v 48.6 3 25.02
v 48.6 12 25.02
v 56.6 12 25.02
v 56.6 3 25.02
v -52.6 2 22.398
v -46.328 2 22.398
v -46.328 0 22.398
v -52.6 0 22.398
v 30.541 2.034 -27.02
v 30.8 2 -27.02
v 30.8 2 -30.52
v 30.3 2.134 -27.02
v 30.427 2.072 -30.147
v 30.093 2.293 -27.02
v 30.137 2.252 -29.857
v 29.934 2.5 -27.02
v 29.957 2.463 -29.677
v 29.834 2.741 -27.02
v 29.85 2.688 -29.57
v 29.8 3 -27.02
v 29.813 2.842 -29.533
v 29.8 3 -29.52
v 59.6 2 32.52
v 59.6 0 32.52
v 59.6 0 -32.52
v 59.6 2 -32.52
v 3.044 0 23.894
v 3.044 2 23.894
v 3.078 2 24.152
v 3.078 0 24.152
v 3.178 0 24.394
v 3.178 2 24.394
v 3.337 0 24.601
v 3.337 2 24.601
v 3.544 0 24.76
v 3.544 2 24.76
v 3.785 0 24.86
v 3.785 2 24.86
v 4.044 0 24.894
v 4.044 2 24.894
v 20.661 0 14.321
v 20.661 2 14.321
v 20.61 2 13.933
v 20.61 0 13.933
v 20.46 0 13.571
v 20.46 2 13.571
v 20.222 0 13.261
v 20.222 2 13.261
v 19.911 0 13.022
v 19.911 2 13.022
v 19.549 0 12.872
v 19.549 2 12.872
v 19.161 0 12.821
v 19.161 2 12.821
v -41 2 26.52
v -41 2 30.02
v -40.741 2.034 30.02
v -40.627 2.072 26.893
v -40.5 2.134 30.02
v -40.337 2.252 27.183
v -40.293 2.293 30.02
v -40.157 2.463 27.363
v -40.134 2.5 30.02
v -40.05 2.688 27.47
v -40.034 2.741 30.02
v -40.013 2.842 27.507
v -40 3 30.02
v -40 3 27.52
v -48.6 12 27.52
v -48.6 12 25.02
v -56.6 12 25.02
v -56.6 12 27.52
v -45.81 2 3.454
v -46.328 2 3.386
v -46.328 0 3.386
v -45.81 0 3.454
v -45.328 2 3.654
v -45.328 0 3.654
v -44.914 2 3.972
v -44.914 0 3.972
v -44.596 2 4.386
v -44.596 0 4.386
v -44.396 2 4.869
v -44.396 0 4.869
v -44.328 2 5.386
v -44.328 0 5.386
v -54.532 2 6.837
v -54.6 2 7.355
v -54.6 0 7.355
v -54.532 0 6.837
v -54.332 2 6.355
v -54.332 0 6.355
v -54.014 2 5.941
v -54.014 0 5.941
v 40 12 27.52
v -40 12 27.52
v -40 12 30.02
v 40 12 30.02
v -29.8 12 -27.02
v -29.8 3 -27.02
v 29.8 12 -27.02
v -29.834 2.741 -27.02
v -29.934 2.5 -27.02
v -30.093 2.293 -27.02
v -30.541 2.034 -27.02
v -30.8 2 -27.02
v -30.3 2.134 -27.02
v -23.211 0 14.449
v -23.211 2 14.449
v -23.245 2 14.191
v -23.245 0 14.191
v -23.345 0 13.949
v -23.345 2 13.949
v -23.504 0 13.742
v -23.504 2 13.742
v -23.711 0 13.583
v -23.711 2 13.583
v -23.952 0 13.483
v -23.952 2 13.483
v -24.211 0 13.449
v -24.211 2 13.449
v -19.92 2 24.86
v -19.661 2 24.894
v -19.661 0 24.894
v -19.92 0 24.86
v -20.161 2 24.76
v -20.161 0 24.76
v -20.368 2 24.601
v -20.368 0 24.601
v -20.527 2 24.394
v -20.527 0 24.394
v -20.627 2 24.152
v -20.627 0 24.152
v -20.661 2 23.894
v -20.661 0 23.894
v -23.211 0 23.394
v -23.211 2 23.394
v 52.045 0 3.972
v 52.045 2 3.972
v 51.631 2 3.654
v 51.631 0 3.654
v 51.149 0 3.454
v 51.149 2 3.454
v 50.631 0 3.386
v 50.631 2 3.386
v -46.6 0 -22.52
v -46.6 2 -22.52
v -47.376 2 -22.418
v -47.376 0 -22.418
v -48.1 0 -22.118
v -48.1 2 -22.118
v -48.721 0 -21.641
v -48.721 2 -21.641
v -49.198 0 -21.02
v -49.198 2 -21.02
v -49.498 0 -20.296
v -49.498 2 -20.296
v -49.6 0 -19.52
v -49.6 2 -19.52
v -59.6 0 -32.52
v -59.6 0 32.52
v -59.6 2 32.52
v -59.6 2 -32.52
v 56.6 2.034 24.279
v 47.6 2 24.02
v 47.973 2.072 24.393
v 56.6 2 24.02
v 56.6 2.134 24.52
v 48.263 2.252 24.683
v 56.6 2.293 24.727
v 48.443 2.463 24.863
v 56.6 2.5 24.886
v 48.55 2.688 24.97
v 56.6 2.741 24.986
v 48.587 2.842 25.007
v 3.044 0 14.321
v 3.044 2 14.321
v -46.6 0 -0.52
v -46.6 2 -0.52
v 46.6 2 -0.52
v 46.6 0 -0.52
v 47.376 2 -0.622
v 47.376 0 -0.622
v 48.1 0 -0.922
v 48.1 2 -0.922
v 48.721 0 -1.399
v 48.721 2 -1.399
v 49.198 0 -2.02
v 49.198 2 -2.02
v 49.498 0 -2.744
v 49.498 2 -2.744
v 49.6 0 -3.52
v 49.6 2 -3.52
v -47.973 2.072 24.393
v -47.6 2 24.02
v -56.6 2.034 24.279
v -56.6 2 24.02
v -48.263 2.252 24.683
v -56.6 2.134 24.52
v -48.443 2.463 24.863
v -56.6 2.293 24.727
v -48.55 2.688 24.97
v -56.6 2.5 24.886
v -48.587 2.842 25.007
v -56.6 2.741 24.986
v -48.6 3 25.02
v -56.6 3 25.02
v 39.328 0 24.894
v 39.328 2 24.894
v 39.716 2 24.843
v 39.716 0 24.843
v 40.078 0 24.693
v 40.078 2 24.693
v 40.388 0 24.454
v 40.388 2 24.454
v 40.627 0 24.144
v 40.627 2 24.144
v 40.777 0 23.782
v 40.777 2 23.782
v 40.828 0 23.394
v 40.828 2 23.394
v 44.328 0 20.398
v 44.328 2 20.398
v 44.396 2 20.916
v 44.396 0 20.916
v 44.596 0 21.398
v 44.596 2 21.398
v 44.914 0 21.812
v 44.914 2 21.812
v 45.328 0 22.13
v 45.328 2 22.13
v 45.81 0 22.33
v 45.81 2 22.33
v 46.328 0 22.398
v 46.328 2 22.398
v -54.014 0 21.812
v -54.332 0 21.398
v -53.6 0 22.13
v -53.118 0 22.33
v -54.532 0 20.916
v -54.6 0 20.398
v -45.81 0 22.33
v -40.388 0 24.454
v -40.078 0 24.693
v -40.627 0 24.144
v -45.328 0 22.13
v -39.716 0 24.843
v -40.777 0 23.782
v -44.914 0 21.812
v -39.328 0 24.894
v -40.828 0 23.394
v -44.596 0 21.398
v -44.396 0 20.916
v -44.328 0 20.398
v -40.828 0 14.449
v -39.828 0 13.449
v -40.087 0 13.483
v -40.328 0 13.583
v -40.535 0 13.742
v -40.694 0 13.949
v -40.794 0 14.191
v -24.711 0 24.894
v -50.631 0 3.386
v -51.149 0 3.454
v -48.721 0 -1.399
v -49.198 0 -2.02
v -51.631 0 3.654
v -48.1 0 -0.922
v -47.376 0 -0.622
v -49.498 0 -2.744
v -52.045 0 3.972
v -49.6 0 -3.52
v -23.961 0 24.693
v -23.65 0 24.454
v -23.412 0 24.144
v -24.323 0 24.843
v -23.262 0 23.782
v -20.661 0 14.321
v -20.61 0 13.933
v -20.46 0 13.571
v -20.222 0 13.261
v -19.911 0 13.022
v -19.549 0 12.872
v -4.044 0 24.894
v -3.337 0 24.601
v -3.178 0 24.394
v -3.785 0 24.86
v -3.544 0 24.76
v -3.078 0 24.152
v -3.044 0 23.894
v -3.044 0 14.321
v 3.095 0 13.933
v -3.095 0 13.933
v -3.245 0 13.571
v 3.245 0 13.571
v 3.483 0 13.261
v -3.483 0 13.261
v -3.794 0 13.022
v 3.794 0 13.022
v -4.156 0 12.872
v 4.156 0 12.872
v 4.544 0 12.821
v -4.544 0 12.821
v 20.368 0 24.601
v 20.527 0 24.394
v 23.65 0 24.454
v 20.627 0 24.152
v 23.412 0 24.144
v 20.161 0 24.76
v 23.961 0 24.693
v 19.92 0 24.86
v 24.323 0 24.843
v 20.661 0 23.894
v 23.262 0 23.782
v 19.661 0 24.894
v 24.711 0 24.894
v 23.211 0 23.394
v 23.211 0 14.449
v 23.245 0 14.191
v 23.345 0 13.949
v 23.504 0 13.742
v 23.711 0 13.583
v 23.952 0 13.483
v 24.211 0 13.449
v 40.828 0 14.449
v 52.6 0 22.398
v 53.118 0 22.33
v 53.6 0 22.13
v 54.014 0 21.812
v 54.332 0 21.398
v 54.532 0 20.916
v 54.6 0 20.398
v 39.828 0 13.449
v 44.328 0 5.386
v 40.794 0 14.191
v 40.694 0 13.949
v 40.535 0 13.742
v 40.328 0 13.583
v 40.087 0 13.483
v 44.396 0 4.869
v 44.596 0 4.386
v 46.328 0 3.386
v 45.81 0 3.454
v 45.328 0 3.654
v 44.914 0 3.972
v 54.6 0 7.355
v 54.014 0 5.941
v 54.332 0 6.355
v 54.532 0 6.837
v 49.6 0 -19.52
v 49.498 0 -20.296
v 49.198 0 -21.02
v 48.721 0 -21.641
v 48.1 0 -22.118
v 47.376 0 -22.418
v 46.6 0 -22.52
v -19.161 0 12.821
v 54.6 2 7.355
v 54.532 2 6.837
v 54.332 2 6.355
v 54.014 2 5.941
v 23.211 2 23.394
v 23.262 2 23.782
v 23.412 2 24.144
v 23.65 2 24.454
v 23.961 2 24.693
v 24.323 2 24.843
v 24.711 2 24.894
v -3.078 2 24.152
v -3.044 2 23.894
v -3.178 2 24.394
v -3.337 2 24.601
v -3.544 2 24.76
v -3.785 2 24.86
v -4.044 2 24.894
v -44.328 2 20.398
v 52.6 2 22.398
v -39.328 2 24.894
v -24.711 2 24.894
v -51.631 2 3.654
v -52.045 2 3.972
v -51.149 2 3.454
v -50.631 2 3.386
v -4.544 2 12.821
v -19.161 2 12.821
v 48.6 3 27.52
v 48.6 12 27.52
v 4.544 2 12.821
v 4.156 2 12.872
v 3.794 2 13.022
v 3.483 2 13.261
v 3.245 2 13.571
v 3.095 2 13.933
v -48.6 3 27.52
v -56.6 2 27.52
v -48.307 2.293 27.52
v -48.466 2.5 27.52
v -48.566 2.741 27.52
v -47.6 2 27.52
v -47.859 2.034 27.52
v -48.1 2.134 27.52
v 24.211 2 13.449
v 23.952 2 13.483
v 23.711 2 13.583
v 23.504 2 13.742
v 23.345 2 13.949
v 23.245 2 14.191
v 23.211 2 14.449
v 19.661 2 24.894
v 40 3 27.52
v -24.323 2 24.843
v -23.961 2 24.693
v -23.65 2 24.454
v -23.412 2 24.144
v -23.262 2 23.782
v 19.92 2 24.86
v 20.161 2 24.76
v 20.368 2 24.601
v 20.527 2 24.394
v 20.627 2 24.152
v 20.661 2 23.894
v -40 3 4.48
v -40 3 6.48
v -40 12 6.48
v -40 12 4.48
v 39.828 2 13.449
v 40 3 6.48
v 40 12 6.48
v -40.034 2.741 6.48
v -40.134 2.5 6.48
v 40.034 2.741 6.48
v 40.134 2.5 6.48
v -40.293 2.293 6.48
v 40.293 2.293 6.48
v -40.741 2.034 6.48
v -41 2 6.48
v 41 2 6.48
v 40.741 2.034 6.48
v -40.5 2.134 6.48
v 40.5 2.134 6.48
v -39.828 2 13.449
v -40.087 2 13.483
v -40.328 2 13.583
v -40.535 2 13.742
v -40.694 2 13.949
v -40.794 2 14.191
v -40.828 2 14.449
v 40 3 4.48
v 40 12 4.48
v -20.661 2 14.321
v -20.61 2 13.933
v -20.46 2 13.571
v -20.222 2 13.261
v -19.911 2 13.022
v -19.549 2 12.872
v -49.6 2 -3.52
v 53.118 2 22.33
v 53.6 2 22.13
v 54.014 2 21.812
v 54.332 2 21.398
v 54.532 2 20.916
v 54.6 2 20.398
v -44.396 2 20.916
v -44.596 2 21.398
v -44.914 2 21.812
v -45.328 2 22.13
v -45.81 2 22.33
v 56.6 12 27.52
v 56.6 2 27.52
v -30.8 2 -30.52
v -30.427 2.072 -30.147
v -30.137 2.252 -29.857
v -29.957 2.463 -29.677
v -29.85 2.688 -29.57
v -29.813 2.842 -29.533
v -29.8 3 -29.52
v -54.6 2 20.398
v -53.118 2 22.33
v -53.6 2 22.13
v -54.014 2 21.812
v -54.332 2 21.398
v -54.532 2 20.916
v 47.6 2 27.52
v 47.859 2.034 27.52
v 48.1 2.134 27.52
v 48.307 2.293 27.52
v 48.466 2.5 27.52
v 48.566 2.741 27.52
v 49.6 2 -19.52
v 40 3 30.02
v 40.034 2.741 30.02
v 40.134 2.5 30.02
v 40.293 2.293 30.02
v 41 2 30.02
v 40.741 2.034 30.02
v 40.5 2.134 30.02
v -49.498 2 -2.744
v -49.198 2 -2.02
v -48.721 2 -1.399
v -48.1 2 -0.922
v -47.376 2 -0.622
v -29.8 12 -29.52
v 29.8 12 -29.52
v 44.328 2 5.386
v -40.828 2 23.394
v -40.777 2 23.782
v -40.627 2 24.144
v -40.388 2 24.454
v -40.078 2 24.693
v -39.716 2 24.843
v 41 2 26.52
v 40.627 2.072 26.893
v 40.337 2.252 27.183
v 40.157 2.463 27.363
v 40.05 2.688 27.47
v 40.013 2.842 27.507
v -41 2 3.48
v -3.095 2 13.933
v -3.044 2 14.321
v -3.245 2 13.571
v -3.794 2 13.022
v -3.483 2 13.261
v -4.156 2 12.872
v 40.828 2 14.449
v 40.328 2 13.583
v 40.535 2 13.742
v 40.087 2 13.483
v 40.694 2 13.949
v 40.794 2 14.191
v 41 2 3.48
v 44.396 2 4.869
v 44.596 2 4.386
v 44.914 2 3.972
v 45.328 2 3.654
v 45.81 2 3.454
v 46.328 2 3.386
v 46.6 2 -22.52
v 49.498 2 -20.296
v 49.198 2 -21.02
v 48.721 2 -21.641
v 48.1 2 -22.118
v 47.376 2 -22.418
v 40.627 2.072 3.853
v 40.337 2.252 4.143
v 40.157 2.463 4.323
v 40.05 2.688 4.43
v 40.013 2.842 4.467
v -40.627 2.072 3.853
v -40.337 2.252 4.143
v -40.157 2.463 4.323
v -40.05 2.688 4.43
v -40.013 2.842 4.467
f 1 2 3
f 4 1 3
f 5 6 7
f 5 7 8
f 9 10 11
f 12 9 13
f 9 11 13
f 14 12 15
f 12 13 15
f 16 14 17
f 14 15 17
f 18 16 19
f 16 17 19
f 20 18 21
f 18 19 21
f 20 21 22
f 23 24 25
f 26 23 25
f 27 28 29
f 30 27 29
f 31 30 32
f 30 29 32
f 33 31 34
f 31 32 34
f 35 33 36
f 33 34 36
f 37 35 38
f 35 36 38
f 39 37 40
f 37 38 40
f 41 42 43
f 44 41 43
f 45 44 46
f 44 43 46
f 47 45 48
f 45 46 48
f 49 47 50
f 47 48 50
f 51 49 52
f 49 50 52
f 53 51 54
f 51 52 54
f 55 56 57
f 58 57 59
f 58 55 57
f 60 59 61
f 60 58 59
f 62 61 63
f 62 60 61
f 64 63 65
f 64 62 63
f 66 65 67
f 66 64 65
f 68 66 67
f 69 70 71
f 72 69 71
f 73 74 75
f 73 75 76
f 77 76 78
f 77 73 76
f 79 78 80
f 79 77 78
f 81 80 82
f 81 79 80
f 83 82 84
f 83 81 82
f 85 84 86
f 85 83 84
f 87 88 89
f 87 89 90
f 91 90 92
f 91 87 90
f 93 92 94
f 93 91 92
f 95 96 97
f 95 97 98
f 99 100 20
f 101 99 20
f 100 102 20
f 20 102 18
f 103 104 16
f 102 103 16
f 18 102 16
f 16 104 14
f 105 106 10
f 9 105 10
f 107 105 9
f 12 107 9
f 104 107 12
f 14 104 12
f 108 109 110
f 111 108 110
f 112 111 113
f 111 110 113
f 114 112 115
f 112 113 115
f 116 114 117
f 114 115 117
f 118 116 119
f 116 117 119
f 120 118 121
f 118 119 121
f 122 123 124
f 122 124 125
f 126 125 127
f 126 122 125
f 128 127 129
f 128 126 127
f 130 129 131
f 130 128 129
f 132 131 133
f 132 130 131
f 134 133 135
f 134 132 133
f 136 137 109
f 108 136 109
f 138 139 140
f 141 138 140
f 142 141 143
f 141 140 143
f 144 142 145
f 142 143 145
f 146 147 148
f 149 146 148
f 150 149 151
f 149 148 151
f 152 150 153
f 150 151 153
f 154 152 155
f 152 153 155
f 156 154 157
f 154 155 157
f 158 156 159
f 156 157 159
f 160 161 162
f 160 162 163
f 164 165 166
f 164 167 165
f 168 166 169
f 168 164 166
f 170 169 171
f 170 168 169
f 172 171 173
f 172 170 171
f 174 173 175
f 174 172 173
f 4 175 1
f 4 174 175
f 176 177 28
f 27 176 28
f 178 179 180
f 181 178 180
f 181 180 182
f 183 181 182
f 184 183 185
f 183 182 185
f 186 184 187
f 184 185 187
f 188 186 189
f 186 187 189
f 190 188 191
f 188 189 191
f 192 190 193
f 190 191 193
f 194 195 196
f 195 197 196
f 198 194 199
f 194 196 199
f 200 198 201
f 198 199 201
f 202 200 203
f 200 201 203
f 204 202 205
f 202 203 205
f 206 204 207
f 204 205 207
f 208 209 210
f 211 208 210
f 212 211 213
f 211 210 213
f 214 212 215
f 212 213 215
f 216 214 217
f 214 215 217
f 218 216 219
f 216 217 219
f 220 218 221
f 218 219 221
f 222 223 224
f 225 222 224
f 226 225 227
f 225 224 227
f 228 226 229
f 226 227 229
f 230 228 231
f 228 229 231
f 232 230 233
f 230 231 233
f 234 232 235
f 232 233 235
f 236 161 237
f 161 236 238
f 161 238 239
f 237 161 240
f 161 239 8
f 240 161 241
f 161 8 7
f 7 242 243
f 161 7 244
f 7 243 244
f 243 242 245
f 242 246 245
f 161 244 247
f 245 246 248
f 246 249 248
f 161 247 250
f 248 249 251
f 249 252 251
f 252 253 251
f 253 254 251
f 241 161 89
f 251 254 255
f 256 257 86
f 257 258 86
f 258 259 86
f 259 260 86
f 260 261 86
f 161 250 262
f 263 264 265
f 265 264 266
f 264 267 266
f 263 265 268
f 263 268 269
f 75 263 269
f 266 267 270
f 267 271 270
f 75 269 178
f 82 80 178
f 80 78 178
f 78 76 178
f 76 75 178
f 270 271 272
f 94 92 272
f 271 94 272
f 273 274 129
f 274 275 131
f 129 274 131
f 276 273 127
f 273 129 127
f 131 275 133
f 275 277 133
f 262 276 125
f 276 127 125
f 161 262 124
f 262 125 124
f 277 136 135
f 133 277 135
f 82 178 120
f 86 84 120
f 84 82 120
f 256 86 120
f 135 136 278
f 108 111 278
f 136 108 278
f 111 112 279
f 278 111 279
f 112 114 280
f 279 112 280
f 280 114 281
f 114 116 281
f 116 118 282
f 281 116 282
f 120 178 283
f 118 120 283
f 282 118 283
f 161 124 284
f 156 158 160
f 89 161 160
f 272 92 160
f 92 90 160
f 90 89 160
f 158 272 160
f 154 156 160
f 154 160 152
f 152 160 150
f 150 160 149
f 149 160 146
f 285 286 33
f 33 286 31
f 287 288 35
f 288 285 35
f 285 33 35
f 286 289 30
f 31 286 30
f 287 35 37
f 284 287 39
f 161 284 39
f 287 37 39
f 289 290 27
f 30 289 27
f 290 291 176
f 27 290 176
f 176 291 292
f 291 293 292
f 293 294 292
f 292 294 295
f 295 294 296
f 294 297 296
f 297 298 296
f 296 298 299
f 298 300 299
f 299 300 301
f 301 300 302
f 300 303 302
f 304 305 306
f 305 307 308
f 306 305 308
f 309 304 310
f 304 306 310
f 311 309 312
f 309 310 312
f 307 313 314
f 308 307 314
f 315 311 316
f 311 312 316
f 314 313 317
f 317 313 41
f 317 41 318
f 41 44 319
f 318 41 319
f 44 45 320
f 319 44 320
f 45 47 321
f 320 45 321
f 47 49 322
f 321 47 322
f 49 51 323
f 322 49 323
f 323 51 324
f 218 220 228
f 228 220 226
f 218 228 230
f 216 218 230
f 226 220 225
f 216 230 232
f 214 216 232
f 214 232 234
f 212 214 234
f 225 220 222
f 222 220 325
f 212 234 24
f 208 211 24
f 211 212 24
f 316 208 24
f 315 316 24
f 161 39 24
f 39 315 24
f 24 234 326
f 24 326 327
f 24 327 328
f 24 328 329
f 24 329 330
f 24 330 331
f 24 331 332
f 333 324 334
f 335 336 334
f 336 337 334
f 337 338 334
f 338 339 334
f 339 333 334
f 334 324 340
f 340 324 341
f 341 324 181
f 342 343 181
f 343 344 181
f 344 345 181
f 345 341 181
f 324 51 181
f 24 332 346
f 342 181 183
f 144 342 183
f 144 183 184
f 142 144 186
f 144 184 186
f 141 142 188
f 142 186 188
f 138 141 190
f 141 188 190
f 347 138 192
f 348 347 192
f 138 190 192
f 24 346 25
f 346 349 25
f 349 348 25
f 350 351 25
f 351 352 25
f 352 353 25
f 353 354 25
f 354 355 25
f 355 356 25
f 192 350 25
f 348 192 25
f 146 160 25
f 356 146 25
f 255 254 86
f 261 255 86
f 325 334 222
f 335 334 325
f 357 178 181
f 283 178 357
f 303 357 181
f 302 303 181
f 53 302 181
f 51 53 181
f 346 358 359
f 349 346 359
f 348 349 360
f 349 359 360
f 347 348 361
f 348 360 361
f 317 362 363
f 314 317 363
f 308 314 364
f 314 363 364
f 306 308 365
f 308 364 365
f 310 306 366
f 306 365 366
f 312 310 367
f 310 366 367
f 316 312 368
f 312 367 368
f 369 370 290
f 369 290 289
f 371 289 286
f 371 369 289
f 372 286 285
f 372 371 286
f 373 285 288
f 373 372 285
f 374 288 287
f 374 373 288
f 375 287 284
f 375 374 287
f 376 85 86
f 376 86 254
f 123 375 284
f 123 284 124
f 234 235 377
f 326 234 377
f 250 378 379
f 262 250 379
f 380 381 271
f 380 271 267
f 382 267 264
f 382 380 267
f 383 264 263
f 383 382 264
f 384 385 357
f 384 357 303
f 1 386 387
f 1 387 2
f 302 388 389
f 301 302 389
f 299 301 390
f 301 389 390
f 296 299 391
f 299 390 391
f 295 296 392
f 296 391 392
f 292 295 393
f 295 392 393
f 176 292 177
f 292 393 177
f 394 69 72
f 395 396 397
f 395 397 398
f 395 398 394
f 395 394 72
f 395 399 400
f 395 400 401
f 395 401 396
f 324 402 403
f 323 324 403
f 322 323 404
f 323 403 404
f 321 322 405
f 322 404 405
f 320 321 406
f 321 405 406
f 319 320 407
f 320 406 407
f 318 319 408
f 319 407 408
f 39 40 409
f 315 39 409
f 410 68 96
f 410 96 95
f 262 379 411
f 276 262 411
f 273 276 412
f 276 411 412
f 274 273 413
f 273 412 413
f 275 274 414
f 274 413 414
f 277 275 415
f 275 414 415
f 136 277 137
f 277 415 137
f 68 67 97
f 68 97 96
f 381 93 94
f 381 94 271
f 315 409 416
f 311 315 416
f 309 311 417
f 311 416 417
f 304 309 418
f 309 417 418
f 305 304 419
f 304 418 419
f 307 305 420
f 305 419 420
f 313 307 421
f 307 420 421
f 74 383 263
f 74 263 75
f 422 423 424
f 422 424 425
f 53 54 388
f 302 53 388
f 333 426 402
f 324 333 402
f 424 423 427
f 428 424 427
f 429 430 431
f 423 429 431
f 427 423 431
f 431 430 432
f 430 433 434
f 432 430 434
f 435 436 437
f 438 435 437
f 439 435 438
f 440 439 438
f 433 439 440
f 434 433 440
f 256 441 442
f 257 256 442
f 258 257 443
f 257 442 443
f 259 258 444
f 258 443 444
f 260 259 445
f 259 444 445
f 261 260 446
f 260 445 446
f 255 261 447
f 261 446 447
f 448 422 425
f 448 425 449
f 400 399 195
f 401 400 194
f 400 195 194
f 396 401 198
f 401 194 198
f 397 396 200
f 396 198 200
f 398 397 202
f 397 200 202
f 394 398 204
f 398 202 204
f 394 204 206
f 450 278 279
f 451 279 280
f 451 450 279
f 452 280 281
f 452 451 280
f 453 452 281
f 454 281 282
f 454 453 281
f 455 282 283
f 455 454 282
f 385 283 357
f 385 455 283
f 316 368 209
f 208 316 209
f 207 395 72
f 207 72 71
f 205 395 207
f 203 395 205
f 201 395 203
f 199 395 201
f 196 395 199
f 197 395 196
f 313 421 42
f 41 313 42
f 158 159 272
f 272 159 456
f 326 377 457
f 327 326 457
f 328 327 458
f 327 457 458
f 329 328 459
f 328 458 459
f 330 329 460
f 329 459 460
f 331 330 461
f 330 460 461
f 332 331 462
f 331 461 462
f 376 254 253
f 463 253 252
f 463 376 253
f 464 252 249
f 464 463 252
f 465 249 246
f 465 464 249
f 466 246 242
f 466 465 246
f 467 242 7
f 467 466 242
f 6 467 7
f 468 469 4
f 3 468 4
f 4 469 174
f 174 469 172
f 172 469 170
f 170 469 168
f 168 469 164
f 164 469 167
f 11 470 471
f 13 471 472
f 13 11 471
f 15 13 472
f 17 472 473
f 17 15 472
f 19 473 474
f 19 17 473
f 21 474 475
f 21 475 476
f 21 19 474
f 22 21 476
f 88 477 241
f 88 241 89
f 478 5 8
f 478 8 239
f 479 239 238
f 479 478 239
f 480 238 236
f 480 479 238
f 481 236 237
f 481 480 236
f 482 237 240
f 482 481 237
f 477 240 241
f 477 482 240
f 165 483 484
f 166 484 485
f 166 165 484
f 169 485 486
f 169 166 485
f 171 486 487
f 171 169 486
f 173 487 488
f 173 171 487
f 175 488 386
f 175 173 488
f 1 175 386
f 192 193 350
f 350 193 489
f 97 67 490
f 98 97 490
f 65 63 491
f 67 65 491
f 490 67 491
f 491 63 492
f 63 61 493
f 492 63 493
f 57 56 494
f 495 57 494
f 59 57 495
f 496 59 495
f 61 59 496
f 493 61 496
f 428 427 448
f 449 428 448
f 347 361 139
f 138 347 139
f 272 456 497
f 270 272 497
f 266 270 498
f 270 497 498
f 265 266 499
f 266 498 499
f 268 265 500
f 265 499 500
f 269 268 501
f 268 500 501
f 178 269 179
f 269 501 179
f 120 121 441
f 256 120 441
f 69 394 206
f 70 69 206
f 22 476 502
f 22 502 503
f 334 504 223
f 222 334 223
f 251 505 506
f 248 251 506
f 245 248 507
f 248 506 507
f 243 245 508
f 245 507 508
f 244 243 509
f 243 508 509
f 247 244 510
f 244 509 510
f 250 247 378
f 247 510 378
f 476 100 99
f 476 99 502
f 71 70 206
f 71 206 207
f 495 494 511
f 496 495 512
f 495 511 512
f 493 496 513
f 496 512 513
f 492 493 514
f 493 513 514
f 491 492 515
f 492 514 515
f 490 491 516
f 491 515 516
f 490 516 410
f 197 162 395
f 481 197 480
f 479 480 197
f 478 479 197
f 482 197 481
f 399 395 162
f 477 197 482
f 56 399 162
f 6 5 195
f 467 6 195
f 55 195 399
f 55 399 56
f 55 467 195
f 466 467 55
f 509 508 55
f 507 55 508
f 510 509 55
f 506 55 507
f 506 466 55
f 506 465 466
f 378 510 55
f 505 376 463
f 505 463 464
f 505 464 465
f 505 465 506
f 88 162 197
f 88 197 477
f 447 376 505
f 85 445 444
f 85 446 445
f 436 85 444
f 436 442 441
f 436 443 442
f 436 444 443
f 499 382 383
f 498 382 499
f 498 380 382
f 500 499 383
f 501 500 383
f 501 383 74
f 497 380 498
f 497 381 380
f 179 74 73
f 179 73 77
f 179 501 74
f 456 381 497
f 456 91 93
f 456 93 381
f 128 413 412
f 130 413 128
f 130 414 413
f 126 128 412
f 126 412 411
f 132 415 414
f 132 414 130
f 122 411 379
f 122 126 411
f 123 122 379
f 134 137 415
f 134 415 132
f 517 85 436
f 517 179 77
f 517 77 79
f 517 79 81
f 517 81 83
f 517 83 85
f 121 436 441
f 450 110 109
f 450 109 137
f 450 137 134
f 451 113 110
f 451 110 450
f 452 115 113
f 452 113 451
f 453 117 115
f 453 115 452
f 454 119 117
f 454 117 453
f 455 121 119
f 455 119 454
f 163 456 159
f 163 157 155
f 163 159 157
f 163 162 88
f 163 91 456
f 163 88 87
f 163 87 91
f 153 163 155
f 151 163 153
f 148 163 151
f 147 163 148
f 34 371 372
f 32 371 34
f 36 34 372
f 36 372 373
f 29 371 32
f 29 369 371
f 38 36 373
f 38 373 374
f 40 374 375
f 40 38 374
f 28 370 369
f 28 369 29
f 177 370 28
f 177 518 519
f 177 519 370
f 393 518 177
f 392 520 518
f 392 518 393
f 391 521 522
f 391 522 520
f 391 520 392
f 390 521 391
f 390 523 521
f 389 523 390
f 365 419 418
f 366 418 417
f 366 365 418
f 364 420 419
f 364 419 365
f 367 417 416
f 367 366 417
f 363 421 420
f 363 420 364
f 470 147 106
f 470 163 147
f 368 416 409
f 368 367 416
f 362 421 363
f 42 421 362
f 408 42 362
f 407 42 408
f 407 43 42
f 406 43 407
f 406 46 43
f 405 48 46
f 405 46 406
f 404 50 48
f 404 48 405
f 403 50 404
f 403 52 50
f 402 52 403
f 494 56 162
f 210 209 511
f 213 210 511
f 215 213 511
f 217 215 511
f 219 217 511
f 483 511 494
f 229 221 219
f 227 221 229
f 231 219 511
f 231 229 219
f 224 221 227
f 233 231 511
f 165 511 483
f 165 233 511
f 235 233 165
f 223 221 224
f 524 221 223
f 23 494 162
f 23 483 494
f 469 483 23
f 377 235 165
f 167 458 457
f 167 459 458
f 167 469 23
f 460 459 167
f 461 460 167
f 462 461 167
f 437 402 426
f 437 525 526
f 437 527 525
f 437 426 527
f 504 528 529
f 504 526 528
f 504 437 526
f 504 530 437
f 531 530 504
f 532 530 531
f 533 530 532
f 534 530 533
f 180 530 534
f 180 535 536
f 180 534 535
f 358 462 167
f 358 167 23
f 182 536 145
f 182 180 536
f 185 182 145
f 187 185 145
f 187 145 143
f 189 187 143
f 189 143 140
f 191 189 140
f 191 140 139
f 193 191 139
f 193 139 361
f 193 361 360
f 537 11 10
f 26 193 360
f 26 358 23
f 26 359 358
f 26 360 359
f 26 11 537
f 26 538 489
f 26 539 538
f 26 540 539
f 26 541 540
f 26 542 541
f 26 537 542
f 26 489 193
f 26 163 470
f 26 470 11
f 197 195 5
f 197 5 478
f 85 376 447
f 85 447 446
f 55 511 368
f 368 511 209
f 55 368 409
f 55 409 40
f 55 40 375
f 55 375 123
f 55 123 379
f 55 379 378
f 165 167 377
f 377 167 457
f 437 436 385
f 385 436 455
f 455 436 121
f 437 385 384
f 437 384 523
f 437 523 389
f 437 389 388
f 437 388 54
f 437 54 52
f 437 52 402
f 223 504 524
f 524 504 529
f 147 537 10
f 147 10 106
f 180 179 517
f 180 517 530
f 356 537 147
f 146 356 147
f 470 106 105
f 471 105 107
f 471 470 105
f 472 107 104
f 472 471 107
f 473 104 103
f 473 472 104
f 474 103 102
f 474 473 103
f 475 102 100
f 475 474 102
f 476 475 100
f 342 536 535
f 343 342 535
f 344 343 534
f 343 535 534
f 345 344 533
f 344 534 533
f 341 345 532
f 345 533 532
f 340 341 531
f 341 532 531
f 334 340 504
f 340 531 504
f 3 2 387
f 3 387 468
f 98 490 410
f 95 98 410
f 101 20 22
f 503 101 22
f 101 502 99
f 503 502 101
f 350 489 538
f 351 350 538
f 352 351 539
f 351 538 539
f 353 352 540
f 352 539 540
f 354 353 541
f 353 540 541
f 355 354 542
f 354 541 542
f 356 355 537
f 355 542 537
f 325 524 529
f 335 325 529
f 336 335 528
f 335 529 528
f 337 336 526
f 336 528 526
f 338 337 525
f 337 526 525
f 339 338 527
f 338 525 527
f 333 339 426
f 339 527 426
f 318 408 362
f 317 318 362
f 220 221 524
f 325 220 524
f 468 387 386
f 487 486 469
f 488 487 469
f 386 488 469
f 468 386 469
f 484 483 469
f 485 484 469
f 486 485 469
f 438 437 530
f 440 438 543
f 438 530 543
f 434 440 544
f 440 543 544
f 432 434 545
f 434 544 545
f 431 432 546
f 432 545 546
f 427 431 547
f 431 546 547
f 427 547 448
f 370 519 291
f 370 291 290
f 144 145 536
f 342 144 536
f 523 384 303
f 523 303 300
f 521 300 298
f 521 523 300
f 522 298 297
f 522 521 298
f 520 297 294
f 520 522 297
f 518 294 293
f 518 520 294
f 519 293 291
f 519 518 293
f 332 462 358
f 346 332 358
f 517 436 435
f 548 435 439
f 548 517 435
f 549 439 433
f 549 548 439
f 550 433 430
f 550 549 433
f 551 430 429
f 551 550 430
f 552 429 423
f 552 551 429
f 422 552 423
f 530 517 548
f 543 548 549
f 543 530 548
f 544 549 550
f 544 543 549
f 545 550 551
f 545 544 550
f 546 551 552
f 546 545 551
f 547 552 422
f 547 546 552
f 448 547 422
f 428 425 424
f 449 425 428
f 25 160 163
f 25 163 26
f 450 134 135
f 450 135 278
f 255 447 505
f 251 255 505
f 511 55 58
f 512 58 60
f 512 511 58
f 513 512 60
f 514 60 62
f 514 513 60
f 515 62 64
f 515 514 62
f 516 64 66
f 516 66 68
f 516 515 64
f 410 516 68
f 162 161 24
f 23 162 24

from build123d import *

# Parameters (mm, degrees)
SKETCH1_W           = 119.2
SKETCH1_H           = 65.04
BOSS_EXTRUDE1_DEPTH = 2
SKETCH2_W           = 59.6
SKETCH2_H           = 2.5
SKETCH2_W_2         = 80
SKETCH2_H_2         = 2
BOSS_EXTRUDE2_DEPTH = 10
FILLET1_R           = 1
SKETCH4_W           = 80
SKETCH4_H           = 2.5
SKETCH4_W_2         = 8
BOSS_EXTRUDE3_DEPTH = 10
FILLET2_R           = 1
FILLET3_R           = 1
CUT_EXTRUDE2_DEPTH  = 10
CUT_EXTRUDE3_DEPTH  = 10


with BuildPart() as part:
    # Sketch1 → Boss-Extrude1 (new body)
    with BuildSketch(Plane(origin=(0, 0, 0), x_dir=(1, 0, 0), z_dir=(0, 1, 0))):
        Rectangle(SKETCH1_W, SKETCH1_H)
    extrude(amount=BOSS_EXTRUDE1_DEPTH)

    # Sketch2 → Boss-Extrude2 (add)
    with BuildSketch(Plane(origin=(0, 2, 0), x_dir=(1, 0, 0), z_dir=(0, 1, 0))):
        with Locations((0, 28.27)):
            Rectangle(SKETCH2_W, SKETCH2_H)
        with Locations((0, -5.48)):
            Rectangle(SKETCH2_W_2, SKETCH2_H_2)
    extrude(amount=BOSS_EXTRUDE2_DEPTH)

    # Fillet1
    fillet1_edges = [part.edges().sort_by_distance(p)[0] for p in [
        (40, 2, 5.48),
        (0, 2, 4.48),
        (-40, 2, 5.48),
        (-29.8, 2, -28.27),
        (29.8, 2, -28.27),
        (0, 2, -29.52),
    ]]
    fillet(fillet1_edges, radius=FILLET1_R)

    # Sketch4 → Boss-Extrude3 (add)
    with BuildSketch(Plane(origin=(0, 2, 0), x_dir=(1, 0, 0), z_dir=(0, 1, 0))):
        with Locations((0, -28.77)):
            Rectangle(SKETCH4_W, SKETCH4_H)
        with Locations((52.6, -26.27)):
            Rectangle(SKETCH4_W_2, SKETCH4_H)
    boss_extrude3 = extrude(amount=BOSS_EXTRUDE3_DEPTH)

    # Fillet2
    fillet2_edges = [part.edges().sort_by_distance(p)[0] for p in [
        (-40, 2, 28.77),
        (48.6, 2, 26.27),
        (52.6, 2, 25.02),
        (40, 2, 28.77),
        (0, 2, 27.52),
    ]]
    fillet(fillet2_edges, radius=FILLET2_R)

    # Mirror1: Boss-Extrude3 across plane
    add(boss_extrude3.mirror(Plane.ZY))

    # Fillet3
    fillet3_edges = [part.edges().sort_by_distance(p)[0] for p in [
        (-48.6, 2, 26.27),
        (-52.6, 2, 25.02),
    ]]
    fillet(fillet3_edges, radius=FILLET3_R)

    # Sketch5 → Cut-Extrude2 (cut)
    with BuildSketch(Plane(origin=(0, 2, 0), x_dir=(1, 0, 0), z_dir=(0, 1, 0))):
        with BuildLine():
            Line((46.6, 22.52), (6.311514948, 22.52))
            Line((6.311514948, 22.52), (-46.6, 22.52))
            ThreePointArc((-46.6, 22.52), (-48.721320344, 21.641320344), (-49.6, 19.52))
            Line((-49.6, 19.52), (-49.6, 3.52))
            ThreePointArc((-49.6, 3.52), (-48.721320344, 1.398679656), (-46.6, 0.52))
            Line((-46.6, 0.52), (46.6, 0.52))
            ThreePointArc((46.6, 0.52), (48.721320344, 1.398679656), (49.6, 3.52))
            Line((49.6, 3.52), (49.6, 19.52))
            ThreePointArc((49.6, 19.52), (48.721320344, 21.641320344), (46.6, 22.52))
        make_face()
    extrude(amount=-CUT_EXTRUDE2_DEPTH, mode=Mode.SUBTRACT)

    # Sketch6 → Cut-Extrude3 (cut)
    with BuildSketch(Plane(origin=(0, 2, 0), x_dir=(1, 0, 0), z_dir=(0, 1, 0))):
        with BuildLine():
            Line((54.014213562, -5.94084617), (52.045315698, -3.971948306))
            ThreePointArc((52.045315698, -3.971948306), (51.396469, -3.538402803), (50.631102135, -3.386161868))
            Line((50.631102135, -3.386161868), (46.32782558, -3.386161868))
            ThreePointArc((46.32782558, -3.386161868), (44.913612017, -3.971948306), (44.32782558, -5.386161868))
            Line((44.32782558, -5.386161868), (44.32782558, -20.397912268))
            ThreePointArc((44.32782558, -20.397912268), (44.913612017, -21.812125831), (46.32782558, -22.397912268))
            Line((46.32782558, -22.397912268), (52.6, -22.397912268))
            ThreePointArc((52.6, -22.397912268), (54.014213562, -21.812125831), (54.6, -20.397912268))
            Line((54.6, -20.397912268), (54.6, -7.355059733))
            ThreePointArc((54.6, -7.355059733), (54.447759065, -6.589692868), (54.014213562, -5.94084617))
        make_face()
        with BuildLine():
            Line((39.82782558, -13.44932419), (24.210760832, -13.44932419))
            ThreePointArc((24.210760832, -13.44932419), (23.503654051, -13.742217409), (23.210760832, -14.44932419))
            Line((23.210760832, -14.44932419), (23.210760832, -23.393622011))
            ThreePointArc((23.210760832, -23.393622011), (23.650100661, -24.454282183), (24.710760832, -24.893622011))
            Line((24.710760832, -24.893622011), (39.32782558, -24.893622011))
            ThreePointArc((39.32782558, -24.893622011), (40.388485752, -24.454282183), (40.82782558, -23.393622011))
            Line((40.82782558, -23.393622011), (40.82782558, -14.44932419))
            ThreePointArc((40.82782558, -14.44932419), (40.534932361, -13.742217409), (39.82782558, -13.44932419))
        make_face()
        with BuildLine():
            Line((4.043952302, -24.893622011), (19.660852384, -24.893622011))
            ThreePointArc((19.660852384, -24.893622011), (20.367959165, -24.600728792), (20.660852384, -23.893622011))
            Line((20.660852384, -23.893622011), (20.660852384, -14.321364431))
            ThreePointArc((20.660852384, -14.321364431), (20.221512556, -13.260704259), (19.160852384, -12.821364431))
            Line((19.160852384, -12.821364431), (4.543952302, -12.821364431))
            ThreePointArc((4.543952302, -12.821364431), (3.48329213, -13.260704259), (3.043952302, -14.321364431))
            Line((3.043952302, -14.321364431), (3.043952302, -23.893622011))
            ThreePointArc((3.043952302, -23.893622011), (3.336845521, -24.600728792), (4.043952302, -24.893622011))
        make_face()
        with BuildLine():
            Line((-4.043952302, -24.893622011), (-19.660852384, -24.893622011))
            ThreePointArc((-19.660852384, -24.893622011), (-20.367959165, -24.600728792), (-20.660852384, -23.893622011))
            Line((-20.660852384, -23.893622011), (-20.660852384, -14.321364431))
            ThreePointArc((-20.660852384, -14.321364431), (-20.221512556, -13.260704259), (-19.160852384, -12.821364431))
            Line((-19.160852384, -12.821364431), (-4.543952302, -12.821364431))
            ThreePointArc((-4.543952302, -12.821364431), (-3.48329213, -13.260704259), (-3.043952302, -14.321364431))
            Line((-3.043952302, -14.321364431), (-3.043952302, -23.893622011))
            ThreePointArc((-3.043952302, -23.893622011), (-3.336845521, -24.600728792), (-4.043952302, -24.893622011))
        make_face()
        with BuildLine():
            Line((-39.32782558, -24.893622011), (-24.710760832, -24.893622011))
            ThreePointArc((-24.710760832, -24.893622011), (-23.650100661, -24.454282183), (-23.210760832, -23.393622011))
            Line((-23.210760832, -23.393622011), (-23.210760832, -14.44932419))
            ThreePointArc((-23.210760832, -14.44932419), (-23.503654051, -13.742217409), (-24.210760832, -13.44932419))
            Line((-24.210760832, -13.44932419), (-39.82782558, -13.44932419))
            ThreePointArc((-39.82782558, -13.44932419), (-40.534932361, -13.742217409), (-40.82782558, -14.44932419))
            Line((-40.82782558, -14.44932419), (-40.82782558, -23.393622011))
            ThreePointArc((-40.82782558, -23.393622011), (-40.388485752, -24.454282183), (-39.32782558, -24.893622011))
        make_face()
        with BuildLine():
            Line((-44.32782558, -5.386161868), (-44.32782558, -20.397912268))
            ThreePointArc((-44.32782558, -20.397912268), (-44.913612017, -21.812125831), (-46.32782558, -22.397912268))
            Line((-46.32782558, -22.397912268), (-52.6, -22.397912268))
            ThreePointArc((-52.6, -22.397912268), (-54.014213562, -21.812125831), (-54.6, -20.397912268))
            Line((-54.6, -20.397912268), (-54.6, -7.355059733))
            ThreePointArc((-54.6, -7.355059733), (-54.447759065, -6.589692868), (-54.014213562, -5.94084617))
            Line((-54.014213562, -5.94084617), (-52.045315698, -3.971948306))
            ThreePointArc((-52.045315698, -3.971948306), (-51.396469, -3.538402803), (-50.631102135, -3.386161868))
            Line((-50.631102135, -3.386161868), (-46.32782558, -3.386161868))
            ThreePointArc((-46.32782558, -3.386161868), (-44.913612017, -3.971948306), (-44.32782558, -5.386161868))
        make_face()
    extrude(amount=-CUT_EXTRUDE3_DEPTH, mode=Mode.SUBTRACT)


solid = part.part
